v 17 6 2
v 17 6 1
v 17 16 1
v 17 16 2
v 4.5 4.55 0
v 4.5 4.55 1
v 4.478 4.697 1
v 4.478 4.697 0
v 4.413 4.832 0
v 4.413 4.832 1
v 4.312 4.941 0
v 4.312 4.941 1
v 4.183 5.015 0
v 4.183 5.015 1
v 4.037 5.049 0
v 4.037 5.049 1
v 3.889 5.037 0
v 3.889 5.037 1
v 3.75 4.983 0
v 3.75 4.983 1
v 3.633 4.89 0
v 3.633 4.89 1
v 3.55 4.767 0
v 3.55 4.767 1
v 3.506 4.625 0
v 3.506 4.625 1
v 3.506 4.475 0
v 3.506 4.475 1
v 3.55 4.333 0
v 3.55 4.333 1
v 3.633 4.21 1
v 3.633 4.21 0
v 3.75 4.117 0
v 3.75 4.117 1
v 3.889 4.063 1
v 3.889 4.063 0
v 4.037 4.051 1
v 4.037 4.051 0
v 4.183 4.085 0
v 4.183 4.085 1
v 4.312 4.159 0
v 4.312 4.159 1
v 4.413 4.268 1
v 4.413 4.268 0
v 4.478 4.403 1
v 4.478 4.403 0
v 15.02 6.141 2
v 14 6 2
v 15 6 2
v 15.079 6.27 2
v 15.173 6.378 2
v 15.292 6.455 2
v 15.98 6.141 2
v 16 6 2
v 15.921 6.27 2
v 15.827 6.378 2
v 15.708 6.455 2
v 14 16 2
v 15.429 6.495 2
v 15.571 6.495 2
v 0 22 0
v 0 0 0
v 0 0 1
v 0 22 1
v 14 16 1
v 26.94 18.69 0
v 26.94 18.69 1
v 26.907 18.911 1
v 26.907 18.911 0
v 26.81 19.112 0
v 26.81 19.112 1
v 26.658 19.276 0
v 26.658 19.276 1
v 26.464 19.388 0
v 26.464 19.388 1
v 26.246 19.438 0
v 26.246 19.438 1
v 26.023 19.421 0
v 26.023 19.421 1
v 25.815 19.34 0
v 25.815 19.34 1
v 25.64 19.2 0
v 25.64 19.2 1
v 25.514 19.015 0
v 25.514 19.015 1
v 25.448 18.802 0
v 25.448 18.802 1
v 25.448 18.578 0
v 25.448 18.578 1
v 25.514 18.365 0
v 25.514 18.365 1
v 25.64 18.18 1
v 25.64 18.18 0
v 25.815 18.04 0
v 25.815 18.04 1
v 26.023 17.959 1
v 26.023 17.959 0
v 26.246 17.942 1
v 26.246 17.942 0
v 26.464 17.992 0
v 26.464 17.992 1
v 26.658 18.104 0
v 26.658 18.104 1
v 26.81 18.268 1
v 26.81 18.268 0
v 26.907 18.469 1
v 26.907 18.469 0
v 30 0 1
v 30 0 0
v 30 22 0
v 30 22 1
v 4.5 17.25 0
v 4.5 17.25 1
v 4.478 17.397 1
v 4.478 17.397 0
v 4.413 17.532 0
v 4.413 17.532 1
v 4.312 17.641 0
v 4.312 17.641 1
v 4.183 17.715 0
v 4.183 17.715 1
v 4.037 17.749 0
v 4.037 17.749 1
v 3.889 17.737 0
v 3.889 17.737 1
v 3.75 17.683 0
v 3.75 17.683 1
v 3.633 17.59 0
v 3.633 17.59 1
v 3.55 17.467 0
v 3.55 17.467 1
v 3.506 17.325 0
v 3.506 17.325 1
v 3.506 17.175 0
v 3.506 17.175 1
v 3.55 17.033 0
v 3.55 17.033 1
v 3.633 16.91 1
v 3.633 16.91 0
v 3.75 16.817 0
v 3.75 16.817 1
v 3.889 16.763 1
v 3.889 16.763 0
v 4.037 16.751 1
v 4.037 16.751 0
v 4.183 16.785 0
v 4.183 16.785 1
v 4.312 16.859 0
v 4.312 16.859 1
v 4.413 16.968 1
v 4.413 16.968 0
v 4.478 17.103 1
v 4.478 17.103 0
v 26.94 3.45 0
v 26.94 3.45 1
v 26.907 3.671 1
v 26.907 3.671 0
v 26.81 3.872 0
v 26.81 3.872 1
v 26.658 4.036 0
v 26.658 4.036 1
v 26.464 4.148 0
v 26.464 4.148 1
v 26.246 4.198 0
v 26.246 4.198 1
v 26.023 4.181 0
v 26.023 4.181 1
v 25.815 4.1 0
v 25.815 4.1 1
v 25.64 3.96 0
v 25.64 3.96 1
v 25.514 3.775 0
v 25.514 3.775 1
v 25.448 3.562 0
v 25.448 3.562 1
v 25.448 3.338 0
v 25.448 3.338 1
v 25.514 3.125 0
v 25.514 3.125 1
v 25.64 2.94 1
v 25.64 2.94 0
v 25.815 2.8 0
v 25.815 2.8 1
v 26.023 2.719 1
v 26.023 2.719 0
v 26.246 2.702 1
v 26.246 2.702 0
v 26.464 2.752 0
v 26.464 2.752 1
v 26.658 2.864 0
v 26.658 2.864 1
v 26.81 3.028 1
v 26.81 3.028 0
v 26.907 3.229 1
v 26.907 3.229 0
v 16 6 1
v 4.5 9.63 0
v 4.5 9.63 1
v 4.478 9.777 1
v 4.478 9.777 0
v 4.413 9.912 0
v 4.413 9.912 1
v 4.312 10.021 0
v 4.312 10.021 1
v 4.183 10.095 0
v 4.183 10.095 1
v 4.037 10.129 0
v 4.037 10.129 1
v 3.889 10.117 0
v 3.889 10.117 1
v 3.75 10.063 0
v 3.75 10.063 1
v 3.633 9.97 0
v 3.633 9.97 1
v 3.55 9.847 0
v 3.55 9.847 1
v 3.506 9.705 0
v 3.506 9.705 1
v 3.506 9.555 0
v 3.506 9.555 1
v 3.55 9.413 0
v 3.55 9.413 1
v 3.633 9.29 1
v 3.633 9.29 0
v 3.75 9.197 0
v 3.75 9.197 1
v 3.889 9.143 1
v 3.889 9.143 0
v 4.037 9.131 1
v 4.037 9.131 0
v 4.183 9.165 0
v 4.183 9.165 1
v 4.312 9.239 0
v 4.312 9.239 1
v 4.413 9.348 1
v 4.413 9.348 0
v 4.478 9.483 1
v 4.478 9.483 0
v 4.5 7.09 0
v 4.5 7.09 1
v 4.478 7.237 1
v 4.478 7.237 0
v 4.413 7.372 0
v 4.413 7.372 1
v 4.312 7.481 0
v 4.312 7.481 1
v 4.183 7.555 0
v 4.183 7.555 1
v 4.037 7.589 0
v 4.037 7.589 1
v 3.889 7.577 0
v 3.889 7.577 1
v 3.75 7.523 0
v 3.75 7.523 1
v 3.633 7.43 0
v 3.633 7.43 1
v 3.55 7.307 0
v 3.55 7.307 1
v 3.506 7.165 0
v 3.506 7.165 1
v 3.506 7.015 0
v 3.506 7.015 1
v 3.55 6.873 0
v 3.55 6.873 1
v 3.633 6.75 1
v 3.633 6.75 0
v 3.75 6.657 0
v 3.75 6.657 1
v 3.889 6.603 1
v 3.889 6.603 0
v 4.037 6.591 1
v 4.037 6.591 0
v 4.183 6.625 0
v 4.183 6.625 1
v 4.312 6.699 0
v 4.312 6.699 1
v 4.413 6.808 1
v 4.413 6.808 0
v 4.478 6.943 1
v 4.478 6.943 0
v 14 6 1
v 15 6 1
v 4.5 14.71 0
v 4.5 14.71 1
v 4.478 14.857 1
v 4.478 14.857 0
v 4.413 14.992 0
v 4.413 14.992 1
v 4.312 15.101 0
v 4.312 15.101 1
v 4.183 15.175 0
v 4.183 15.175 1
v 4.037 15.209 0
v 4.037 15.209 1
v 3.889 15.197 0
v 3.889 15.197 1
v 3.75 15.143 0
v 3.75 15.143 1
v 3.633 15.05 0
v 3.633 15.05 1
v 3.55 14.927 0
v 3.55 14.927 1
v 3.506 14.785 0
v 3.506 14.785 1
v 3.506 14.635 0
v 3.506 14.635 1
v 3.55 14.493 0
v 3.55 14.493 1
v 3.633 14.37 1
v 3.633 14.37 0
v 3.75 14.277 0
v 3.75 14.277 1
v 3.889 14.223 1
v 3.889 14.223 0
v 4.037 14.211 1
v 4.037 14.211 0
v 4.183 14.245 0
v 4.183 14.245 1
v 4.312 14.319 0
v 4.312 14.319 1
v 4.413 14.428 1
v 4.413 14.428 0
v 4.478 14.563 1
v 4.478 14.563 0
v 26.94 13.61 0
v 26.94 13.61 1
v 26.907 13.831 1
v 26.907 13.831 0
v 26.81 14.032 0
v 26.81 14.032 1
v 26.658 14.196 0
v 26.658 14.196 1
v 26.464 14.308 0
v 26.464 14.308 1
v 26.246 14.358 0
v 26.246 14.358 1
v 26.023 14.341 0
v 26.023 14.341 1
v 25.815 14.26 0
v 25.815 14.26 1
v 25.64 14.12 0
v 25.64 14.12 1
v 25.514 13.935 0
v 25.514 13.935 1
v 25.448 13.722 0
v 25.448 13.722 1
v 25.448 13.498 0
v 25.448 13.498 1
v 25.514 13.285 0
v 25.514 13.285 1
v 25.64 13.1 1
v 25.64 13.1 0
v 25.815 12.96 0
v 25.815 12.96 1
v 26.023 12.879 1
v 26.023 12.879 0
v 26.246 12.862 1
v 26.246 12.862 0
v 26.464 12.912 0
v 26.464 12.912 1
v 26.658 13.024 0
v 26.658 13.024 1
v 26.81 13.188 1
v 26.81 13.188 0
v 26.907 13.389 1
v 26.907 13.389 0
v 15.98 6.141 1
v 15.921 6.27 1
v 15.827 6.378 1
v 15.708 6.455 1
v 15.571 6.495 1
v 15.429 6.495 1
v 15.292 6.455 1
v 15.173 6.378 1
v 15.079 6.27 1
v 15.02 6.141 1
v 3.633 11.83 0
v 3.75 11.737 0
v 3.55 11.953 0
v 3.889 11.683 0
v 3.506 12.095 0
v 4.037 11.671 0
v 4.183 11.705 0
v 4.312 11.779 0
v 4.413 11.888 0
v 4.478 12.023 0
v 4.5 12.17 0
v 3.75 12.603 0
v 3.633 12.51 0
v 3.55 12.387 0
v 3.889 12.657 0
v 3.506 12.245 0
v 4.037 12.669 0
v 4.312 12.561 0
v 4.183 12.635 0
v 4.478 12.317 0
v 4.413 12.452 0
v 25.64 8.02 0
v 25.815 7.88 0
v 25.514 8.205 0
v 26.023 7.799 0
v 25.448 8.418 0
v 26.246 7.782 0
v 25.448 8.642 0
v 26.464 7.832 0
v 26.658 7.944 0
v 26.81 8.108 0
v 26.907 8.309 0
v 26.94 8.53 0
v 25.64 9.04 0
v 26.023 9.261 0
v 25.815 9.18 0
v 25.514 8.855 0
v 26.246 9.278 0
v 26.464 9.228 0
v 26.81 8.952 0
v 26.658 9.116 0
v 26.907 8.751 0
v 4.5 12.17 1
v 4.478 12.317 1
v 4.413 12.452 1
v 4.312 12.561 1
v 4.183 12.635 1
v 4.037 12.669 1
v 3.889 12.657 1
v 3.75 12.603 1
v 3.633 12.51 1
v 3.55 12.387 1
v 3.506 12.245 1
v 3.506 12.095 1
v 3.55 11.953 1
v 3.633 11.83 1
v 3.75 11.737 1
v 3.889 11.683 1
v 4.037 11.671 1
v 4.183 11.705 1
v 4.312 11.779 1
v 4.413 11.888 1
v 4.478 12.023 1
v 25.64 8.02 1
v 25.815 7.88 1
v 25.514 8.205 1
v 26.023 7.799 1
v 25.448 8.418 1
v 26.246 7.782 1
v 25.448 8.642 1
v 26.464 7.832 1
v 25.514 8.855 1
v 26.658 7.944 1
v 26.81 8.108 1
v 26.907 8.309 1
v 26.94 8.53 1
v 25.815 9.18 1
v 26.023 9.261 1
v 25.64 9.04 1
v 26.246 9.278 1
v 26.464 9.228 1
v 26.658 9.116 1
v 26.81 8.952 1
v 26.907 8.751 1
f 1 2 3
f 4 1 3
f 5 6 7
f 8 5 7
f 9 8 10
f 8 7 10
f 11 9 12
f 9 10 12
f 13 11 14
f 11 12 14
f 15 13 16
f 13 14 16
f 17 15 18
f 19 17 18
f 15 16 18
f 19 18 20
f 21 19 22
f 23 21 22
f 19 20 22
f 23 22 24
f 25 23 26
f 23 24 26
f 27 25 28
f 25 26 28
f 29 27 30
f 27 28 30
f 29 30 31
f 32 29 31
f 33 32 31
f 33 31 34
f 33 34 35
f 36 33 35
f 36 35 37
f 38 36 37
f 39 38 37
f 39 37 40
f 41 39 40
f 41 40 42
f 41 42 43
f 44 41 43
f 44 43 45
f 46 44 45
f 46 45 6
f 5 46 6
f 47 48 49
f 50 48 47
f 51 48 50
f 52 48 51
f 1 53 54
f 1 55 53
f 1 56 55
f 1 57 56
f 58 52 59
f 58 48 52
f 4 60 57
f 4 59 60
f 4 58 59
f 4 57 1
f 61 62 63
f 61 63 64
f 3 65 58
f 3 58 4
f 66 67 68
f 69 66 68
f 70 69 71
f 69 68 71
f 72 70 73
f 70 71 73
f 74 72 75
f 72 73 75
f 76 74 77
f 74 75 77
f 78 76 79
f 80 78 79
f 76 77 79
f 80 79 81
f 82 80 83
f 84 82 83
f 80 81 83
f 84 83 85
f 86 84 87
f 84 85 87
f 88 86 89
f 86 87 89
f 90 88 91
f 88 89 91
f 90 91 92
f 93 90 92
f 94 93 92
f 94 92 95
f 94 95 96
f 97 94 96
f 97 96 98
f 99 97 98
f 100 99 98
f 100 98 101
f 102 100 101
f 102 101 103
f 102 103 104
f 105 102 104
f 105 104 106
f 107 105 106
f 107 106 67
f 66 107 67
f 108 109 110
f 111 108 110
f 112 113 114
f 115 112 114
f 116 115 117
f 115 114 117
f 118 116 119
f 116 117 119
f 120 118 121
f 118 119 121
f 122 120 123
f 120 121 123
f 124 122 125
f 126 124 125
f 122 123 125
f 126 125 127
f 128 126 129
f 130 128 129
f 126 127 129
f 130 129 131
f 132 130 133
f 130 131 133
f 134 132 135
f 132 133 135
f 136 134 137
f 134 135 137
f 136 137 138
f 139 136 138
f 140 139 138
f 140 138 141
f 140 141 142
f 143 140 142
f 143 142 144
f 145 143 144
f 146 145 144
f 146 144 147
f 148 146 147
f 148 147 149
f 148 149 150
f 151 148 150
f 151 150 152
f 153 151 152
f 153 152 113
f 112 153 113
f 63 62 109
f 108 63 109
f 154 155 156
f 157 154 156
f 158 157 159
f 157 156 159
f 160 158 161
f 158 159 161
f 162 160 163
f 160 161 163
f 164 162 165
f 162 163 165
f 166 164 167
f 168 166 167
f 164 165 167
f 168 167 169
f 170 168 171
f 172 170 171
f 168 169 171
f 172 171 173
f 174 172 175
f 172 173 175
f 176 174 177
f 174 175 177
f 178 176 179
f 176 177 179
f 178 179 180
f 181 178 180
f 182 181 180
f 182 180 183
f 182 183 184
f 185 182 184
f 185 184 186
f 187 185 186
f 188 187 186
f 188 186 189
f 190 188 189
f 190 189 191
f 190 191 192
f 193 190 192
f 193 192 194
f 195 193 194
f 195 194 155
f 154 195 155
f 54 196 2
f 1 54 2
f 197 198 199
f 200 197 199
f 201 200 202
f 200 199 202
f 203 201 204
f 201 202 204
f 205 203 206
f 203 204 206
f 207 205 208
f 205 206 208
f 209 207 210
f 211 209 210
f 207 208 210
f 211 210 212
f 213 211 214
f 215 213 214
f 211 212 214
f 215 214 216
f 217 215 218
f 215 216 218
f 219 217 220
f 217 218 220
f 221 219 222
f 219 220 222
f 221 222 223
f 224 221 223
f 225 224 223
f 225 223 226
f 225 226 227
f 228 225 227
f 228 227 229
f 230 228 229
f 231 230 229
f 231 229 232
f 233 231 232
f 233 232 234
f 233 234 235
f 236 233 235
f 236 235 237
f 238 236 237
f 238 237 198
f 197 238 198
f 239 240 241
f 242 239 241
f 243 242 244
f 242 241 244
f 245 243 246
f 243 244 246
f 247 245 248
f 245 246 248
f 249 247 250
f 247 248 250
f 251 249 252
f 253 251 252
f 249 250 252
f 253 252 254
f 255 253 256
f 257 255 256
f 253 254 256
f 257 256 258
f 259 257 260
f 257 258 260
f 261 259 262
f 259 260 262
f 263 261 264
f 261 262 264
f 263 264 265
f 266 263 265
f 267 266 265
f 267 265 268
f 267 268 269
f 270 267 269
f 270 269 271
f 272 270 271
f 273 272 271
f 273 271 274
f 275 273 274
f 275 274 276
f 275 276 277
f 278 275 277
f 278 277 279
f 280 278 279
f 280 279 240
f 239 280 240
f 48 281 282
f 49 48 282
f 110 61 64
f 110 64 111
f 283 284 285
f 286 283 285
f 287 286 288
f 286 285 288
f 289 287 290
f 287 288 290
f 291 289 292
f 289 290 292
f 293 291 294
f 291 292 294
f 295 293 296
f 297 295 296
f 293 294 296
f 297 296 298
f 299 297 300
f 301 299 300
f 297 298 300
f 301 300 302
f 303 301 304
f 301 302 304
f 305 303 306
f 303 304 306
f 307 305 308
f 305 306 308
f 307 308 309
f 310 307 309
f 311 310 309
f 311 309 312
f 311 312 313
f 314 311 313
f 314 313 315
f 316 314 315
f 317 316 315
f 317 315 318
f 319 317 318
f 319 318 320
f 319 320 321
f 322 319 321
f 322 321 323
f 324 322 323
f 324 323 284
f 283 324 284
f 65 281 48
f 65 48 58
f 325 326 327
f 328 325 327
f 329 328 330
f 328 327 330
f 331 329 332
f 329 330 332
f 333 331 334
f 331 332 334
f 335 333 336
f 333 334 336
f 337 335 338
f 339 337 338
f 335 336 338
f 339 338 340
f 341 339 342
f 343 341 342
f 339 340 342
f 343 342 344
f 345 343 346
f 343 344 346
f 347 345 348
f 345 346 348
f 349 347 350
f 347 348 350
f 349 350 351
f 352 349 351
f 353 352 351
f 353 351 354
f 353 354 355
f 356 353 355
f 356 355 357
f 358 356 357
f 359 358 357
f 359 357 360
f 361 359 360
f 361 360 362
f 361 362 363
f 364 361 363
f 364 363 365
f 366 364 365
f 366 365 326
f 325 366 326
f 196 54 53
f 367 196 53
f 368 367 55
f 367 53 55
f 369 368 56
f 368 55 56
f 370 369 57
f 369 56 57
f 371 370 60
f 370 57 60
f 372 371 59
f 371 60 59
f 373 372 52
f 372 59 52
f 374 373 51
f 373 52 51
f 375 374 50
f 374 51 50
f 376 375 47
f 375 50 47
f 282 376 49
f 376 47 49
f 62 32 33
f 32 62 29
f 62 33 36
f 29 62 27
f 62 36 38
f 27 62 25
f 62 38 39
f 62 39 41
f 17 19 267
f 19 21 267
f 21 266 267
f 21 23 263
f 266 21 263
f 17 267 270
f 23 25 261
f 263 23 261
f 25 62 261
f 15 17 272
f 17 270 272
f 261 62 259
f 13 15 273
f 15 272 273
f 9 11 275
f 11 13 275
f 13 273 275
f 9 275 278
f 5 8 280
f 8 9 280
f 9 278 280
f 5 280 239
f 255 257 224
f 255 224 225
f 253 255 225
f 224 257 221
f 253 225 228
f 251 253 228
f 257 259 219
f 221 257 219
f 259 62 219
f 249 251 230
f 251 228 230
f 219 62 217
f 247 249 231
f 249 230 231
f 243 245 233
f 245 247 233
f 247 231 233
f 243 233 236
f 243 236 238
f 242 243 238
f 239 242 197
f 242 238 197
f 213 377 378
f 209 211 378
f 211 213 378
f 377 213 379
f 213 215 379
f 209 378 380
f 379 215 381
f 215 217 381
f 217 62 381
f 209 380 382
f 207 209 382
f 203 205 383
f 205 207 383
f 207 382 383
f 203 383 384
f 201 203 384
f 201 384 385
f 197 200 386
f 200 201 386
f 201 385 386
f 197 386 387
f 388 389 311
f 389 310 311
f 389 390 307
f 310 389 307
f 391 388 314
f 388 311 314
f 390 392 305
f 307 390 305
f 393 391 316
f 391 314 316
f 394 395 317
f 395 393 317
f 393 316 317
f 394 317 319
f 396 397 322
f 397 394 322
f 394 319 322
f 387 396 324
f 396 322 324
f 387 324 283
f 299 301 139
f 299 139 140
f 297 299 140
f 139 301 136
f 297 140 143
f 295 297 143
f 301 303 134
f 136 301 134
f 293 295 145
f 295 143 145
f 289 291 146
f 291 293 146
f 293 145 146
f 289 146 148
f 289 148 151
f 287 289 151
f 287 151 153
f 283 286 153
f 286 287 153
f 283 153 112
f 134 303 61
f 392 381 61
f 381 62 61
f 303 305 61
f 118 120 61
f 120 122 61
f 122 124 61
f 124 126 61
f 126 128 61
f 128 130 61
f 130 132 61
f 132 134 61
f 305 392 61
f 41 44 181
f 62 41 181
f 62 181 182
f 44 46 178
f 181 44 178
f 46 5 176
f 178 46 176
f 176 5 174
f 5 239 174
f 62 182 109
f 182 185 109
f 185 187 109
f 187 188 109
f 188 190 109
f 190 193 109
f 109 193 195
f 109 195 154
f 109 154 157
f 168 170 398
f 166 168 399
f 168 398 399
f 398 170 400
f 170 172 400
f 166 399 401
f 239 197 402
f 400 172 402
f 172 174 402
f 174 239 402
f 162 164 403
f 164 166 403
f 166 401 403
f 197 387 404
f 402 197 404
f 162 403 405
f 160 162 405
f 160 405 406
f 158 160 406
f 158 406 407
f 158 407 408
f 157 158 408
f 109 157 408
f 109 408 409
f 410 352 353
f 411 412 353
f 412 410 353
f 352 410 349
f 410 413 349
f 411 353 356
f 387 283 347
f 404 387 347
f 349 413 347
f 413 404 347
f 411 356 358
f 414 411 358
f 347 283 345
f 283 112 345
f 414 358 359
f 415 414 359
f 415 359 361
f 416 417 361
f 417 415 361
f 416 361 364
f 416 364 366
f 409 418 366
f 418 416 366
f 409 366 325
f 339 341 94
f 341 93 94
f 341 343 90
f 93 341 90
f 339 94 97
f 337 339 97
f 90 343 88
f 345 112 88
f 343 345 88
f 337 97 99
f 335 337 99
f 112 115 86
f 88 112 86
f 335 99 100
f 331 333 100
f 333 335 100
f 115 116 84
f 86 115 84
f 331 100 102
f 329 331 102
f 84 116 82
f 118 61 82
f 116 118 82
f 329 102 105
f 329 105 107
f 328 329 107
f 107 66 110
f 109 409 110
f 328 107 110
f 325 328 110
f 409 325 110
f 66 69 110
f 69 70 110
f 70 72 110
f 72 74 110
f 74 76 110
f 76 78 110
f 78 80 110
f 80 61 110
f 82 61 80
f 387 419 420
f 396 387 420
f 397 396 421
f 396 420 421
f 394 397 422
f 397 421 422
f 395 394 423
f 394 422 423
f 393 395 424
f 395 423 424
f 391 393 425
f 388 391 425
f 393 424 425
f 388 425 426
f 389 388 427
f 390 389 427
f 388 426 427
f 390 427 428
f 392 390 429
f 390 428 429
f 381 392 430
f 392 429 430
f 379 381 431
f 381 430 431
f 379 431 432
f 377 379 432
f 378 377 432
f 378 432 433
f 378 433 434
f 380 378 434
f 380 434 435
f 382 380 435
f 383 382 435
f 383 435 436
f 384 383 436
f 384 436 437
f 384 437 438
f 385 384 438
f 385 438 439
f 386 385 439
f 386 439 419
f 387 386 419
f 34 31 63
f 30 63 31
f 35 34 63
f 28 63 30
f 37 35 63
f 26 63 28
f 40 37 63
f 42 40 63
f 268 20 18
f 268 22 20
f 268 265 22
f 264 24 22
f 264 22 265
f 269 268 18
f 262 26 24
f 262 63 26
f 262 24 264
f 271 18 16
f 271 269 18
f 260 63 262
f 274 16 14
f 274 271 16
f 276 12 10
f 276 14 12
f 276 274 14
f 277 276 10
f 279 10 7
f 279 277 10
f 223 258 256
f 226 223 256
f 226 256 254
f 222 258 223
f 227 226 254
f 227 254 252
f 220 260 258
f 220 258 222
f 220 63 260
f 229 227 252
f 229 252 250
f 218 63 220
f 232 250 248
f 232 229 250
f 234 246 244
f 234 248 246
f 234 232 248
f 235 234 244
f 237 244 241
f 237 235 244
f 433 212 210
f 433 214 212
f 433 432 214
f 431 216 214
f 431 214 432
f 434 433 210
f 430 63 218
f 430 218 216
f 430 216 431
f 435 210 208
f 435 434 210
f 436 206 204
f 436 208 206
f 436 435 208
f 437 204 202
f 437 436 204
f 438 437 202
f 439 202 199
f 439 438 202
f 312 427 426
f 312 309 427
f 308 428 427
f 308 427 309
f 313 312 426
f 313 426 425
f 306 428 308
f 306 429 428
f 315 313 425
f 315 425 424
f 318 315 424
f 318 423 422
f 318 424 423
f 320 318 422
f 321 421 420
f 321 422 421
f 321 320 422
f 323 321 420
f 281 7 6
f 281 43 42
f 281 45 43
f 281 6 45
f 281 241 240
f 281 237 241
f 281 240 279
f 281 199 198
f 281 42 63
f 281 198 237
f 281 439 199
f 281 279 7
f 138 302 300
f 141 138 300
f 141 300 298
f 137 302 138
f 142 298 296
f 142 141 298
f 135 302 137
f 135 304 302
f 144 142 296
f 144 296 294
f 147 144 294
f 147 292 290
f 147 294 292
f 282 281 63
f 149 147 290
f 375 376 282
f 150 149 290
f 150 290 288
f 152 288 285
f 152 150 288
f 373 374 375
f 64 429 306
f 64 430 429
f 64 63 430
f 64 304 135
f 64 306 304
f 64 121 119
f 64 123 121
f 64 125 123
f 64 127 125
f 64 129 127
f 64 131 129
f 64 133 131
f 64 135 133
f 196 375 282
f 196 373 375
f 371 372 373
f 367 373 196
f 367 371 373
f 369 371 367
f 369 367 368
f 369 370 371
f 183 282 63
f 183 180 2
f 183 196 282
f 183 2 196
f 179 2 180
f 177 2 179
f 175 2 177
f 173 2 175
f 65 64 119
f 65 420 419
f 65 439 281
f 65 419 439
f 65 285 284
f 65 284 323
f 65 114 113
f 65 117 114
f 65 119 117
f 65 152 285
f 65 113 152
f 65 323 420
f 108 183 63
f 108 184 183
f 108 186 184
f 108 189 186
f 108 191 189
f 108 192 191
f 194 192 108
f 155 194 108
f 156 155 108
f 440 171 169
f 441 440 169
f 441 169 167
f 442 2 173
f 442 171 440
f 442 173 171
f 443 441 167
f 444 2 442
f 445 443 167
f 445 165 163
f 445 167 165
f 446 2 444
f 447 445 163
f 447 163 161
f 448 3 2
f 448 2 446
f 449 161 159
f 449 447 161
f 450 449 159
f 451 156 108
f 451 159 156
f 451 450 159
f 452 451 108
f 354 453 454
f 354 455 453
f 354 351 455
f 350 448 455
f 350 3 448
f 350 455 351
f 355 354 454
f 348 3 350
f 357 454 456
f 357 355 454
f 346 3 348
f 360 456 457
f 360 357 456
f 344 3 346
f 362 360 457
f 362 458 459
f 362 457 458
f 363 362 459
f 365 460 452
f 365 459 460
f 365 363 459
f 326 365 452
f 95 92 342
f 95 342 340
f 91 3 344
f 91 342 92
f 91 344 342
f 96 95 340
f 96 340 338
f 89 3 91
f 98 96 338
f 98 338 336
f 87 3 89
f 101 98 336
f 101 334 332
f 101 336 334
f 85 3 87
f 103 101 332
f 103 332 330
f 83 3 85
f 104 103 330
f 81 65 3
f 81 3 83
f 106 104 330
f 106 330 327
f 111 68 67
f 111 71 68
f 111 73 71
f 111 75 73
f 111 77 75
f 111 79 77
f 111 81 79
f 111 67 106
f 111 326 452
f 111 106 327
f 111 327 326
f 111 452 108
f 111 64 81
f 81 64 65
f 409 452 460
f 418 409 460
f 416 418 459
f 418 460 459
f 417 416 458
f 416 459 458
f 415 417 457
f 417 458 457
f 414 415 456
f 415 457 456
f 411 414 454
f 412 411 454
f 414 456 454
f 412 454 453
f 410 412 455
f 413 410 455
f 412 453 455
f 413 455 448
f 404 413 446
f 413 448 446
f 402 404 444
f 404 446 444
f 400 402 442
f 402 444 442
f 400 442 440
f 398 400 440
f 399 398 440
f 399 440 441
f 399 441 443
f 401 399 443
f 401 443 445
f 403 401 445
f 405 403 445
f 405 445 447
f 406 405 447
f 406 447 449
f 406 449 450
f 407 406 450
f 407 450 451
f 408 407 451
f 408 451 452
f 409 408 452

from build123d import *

# Parameters (mm, degrees)
SKETCH_1_W          = 30
SKETCH_1_H          = 22
EXTRUDE_1_DEPTH     = 1
SKETCH_2_R          = 0.5
SKETCH_2_R_2        = 0.75
CUT_EXTRUDE_1_DEPTH = 38.215588132
SKETCH_3_W          = 3
SKETCH_3_H          = 10
EXTRUDE_2_DEPTH     = 1
SKETCH_4_R          = 0.5
CUT_EXTRUDE_2_DEPTH = 1


with BuildPart() as part:
    # ｽｹｯﾁ1 → ﾎﾞｽ - 押し出し1 (new body)
    with BuildSketch(Plane.XY):
        with Locations((15, 11)):
            Rectangle(SKETCH_1_W, SKETCH_1_H)
    extrude(amount=EXTRUDE_1_DEPTH)

    # ｽｹｯﾁ2 → ｶｯﾄ - 押し出し1 (cut, through all)
    with BuildSketch(Plane.XY.offset(1)):
        with Locations((4, 17.25)):
            Circle(SKETCH_2_R)
        with Locations((4, 14.71)):
            Circle(SKETCH_2_R)
        with Locations((4, 12.17)):
            Circle(SKETCH_2_R)
        with Locations((4, 9.63)):
            Circle(SKETCH_2_R)
        with Locations((4, 7.09)):
            Circle(SKETCH_2_R)
        with Locations((4, 4.55)):
            Circle(SKETCH_2_R)
        with Locations((26.19, 18.69)):
            Circle(SKETCH_2_R_2)
        with Locations((26.19, 13.61)):
            Circle(SKETCH_2_R_2)
        with Locations((26.19, 8.53)):
            Circle(SKETCH_2_R_2)
        with Locations((26.19, 3.45)):
            Circle(SKETCH_2_R_2)
    extrude(amount=-CUT_EXTRUDE_1_DEPTH, mode=Mode.SUBTRACT)

    # ｽｹｯﾁ3 → ﾎﾞｽ - 押し出し2 (add)
    with BuildSketch(Plane.XY.offset(1)):
        with Locations((15.5, 11)):
            Rectangle(SKETCH_3_W, SKETCH_3_H)
    extrude(amount=EXTRUDE_2_DEPTH)

    # ｽｹｯﾁ4 → ｶｯﾄ - 押し出し2 (cut)
    with BuildSketch(Plane.XY.offset(2)):
        with Locations((15.5, 6)):
            Circle(SKETCH_4_R)
    extrude(amount=-CUT_EXTRUDE_2_DEPTH, mode=Mode.SUBTRACT)


solid = part.part
